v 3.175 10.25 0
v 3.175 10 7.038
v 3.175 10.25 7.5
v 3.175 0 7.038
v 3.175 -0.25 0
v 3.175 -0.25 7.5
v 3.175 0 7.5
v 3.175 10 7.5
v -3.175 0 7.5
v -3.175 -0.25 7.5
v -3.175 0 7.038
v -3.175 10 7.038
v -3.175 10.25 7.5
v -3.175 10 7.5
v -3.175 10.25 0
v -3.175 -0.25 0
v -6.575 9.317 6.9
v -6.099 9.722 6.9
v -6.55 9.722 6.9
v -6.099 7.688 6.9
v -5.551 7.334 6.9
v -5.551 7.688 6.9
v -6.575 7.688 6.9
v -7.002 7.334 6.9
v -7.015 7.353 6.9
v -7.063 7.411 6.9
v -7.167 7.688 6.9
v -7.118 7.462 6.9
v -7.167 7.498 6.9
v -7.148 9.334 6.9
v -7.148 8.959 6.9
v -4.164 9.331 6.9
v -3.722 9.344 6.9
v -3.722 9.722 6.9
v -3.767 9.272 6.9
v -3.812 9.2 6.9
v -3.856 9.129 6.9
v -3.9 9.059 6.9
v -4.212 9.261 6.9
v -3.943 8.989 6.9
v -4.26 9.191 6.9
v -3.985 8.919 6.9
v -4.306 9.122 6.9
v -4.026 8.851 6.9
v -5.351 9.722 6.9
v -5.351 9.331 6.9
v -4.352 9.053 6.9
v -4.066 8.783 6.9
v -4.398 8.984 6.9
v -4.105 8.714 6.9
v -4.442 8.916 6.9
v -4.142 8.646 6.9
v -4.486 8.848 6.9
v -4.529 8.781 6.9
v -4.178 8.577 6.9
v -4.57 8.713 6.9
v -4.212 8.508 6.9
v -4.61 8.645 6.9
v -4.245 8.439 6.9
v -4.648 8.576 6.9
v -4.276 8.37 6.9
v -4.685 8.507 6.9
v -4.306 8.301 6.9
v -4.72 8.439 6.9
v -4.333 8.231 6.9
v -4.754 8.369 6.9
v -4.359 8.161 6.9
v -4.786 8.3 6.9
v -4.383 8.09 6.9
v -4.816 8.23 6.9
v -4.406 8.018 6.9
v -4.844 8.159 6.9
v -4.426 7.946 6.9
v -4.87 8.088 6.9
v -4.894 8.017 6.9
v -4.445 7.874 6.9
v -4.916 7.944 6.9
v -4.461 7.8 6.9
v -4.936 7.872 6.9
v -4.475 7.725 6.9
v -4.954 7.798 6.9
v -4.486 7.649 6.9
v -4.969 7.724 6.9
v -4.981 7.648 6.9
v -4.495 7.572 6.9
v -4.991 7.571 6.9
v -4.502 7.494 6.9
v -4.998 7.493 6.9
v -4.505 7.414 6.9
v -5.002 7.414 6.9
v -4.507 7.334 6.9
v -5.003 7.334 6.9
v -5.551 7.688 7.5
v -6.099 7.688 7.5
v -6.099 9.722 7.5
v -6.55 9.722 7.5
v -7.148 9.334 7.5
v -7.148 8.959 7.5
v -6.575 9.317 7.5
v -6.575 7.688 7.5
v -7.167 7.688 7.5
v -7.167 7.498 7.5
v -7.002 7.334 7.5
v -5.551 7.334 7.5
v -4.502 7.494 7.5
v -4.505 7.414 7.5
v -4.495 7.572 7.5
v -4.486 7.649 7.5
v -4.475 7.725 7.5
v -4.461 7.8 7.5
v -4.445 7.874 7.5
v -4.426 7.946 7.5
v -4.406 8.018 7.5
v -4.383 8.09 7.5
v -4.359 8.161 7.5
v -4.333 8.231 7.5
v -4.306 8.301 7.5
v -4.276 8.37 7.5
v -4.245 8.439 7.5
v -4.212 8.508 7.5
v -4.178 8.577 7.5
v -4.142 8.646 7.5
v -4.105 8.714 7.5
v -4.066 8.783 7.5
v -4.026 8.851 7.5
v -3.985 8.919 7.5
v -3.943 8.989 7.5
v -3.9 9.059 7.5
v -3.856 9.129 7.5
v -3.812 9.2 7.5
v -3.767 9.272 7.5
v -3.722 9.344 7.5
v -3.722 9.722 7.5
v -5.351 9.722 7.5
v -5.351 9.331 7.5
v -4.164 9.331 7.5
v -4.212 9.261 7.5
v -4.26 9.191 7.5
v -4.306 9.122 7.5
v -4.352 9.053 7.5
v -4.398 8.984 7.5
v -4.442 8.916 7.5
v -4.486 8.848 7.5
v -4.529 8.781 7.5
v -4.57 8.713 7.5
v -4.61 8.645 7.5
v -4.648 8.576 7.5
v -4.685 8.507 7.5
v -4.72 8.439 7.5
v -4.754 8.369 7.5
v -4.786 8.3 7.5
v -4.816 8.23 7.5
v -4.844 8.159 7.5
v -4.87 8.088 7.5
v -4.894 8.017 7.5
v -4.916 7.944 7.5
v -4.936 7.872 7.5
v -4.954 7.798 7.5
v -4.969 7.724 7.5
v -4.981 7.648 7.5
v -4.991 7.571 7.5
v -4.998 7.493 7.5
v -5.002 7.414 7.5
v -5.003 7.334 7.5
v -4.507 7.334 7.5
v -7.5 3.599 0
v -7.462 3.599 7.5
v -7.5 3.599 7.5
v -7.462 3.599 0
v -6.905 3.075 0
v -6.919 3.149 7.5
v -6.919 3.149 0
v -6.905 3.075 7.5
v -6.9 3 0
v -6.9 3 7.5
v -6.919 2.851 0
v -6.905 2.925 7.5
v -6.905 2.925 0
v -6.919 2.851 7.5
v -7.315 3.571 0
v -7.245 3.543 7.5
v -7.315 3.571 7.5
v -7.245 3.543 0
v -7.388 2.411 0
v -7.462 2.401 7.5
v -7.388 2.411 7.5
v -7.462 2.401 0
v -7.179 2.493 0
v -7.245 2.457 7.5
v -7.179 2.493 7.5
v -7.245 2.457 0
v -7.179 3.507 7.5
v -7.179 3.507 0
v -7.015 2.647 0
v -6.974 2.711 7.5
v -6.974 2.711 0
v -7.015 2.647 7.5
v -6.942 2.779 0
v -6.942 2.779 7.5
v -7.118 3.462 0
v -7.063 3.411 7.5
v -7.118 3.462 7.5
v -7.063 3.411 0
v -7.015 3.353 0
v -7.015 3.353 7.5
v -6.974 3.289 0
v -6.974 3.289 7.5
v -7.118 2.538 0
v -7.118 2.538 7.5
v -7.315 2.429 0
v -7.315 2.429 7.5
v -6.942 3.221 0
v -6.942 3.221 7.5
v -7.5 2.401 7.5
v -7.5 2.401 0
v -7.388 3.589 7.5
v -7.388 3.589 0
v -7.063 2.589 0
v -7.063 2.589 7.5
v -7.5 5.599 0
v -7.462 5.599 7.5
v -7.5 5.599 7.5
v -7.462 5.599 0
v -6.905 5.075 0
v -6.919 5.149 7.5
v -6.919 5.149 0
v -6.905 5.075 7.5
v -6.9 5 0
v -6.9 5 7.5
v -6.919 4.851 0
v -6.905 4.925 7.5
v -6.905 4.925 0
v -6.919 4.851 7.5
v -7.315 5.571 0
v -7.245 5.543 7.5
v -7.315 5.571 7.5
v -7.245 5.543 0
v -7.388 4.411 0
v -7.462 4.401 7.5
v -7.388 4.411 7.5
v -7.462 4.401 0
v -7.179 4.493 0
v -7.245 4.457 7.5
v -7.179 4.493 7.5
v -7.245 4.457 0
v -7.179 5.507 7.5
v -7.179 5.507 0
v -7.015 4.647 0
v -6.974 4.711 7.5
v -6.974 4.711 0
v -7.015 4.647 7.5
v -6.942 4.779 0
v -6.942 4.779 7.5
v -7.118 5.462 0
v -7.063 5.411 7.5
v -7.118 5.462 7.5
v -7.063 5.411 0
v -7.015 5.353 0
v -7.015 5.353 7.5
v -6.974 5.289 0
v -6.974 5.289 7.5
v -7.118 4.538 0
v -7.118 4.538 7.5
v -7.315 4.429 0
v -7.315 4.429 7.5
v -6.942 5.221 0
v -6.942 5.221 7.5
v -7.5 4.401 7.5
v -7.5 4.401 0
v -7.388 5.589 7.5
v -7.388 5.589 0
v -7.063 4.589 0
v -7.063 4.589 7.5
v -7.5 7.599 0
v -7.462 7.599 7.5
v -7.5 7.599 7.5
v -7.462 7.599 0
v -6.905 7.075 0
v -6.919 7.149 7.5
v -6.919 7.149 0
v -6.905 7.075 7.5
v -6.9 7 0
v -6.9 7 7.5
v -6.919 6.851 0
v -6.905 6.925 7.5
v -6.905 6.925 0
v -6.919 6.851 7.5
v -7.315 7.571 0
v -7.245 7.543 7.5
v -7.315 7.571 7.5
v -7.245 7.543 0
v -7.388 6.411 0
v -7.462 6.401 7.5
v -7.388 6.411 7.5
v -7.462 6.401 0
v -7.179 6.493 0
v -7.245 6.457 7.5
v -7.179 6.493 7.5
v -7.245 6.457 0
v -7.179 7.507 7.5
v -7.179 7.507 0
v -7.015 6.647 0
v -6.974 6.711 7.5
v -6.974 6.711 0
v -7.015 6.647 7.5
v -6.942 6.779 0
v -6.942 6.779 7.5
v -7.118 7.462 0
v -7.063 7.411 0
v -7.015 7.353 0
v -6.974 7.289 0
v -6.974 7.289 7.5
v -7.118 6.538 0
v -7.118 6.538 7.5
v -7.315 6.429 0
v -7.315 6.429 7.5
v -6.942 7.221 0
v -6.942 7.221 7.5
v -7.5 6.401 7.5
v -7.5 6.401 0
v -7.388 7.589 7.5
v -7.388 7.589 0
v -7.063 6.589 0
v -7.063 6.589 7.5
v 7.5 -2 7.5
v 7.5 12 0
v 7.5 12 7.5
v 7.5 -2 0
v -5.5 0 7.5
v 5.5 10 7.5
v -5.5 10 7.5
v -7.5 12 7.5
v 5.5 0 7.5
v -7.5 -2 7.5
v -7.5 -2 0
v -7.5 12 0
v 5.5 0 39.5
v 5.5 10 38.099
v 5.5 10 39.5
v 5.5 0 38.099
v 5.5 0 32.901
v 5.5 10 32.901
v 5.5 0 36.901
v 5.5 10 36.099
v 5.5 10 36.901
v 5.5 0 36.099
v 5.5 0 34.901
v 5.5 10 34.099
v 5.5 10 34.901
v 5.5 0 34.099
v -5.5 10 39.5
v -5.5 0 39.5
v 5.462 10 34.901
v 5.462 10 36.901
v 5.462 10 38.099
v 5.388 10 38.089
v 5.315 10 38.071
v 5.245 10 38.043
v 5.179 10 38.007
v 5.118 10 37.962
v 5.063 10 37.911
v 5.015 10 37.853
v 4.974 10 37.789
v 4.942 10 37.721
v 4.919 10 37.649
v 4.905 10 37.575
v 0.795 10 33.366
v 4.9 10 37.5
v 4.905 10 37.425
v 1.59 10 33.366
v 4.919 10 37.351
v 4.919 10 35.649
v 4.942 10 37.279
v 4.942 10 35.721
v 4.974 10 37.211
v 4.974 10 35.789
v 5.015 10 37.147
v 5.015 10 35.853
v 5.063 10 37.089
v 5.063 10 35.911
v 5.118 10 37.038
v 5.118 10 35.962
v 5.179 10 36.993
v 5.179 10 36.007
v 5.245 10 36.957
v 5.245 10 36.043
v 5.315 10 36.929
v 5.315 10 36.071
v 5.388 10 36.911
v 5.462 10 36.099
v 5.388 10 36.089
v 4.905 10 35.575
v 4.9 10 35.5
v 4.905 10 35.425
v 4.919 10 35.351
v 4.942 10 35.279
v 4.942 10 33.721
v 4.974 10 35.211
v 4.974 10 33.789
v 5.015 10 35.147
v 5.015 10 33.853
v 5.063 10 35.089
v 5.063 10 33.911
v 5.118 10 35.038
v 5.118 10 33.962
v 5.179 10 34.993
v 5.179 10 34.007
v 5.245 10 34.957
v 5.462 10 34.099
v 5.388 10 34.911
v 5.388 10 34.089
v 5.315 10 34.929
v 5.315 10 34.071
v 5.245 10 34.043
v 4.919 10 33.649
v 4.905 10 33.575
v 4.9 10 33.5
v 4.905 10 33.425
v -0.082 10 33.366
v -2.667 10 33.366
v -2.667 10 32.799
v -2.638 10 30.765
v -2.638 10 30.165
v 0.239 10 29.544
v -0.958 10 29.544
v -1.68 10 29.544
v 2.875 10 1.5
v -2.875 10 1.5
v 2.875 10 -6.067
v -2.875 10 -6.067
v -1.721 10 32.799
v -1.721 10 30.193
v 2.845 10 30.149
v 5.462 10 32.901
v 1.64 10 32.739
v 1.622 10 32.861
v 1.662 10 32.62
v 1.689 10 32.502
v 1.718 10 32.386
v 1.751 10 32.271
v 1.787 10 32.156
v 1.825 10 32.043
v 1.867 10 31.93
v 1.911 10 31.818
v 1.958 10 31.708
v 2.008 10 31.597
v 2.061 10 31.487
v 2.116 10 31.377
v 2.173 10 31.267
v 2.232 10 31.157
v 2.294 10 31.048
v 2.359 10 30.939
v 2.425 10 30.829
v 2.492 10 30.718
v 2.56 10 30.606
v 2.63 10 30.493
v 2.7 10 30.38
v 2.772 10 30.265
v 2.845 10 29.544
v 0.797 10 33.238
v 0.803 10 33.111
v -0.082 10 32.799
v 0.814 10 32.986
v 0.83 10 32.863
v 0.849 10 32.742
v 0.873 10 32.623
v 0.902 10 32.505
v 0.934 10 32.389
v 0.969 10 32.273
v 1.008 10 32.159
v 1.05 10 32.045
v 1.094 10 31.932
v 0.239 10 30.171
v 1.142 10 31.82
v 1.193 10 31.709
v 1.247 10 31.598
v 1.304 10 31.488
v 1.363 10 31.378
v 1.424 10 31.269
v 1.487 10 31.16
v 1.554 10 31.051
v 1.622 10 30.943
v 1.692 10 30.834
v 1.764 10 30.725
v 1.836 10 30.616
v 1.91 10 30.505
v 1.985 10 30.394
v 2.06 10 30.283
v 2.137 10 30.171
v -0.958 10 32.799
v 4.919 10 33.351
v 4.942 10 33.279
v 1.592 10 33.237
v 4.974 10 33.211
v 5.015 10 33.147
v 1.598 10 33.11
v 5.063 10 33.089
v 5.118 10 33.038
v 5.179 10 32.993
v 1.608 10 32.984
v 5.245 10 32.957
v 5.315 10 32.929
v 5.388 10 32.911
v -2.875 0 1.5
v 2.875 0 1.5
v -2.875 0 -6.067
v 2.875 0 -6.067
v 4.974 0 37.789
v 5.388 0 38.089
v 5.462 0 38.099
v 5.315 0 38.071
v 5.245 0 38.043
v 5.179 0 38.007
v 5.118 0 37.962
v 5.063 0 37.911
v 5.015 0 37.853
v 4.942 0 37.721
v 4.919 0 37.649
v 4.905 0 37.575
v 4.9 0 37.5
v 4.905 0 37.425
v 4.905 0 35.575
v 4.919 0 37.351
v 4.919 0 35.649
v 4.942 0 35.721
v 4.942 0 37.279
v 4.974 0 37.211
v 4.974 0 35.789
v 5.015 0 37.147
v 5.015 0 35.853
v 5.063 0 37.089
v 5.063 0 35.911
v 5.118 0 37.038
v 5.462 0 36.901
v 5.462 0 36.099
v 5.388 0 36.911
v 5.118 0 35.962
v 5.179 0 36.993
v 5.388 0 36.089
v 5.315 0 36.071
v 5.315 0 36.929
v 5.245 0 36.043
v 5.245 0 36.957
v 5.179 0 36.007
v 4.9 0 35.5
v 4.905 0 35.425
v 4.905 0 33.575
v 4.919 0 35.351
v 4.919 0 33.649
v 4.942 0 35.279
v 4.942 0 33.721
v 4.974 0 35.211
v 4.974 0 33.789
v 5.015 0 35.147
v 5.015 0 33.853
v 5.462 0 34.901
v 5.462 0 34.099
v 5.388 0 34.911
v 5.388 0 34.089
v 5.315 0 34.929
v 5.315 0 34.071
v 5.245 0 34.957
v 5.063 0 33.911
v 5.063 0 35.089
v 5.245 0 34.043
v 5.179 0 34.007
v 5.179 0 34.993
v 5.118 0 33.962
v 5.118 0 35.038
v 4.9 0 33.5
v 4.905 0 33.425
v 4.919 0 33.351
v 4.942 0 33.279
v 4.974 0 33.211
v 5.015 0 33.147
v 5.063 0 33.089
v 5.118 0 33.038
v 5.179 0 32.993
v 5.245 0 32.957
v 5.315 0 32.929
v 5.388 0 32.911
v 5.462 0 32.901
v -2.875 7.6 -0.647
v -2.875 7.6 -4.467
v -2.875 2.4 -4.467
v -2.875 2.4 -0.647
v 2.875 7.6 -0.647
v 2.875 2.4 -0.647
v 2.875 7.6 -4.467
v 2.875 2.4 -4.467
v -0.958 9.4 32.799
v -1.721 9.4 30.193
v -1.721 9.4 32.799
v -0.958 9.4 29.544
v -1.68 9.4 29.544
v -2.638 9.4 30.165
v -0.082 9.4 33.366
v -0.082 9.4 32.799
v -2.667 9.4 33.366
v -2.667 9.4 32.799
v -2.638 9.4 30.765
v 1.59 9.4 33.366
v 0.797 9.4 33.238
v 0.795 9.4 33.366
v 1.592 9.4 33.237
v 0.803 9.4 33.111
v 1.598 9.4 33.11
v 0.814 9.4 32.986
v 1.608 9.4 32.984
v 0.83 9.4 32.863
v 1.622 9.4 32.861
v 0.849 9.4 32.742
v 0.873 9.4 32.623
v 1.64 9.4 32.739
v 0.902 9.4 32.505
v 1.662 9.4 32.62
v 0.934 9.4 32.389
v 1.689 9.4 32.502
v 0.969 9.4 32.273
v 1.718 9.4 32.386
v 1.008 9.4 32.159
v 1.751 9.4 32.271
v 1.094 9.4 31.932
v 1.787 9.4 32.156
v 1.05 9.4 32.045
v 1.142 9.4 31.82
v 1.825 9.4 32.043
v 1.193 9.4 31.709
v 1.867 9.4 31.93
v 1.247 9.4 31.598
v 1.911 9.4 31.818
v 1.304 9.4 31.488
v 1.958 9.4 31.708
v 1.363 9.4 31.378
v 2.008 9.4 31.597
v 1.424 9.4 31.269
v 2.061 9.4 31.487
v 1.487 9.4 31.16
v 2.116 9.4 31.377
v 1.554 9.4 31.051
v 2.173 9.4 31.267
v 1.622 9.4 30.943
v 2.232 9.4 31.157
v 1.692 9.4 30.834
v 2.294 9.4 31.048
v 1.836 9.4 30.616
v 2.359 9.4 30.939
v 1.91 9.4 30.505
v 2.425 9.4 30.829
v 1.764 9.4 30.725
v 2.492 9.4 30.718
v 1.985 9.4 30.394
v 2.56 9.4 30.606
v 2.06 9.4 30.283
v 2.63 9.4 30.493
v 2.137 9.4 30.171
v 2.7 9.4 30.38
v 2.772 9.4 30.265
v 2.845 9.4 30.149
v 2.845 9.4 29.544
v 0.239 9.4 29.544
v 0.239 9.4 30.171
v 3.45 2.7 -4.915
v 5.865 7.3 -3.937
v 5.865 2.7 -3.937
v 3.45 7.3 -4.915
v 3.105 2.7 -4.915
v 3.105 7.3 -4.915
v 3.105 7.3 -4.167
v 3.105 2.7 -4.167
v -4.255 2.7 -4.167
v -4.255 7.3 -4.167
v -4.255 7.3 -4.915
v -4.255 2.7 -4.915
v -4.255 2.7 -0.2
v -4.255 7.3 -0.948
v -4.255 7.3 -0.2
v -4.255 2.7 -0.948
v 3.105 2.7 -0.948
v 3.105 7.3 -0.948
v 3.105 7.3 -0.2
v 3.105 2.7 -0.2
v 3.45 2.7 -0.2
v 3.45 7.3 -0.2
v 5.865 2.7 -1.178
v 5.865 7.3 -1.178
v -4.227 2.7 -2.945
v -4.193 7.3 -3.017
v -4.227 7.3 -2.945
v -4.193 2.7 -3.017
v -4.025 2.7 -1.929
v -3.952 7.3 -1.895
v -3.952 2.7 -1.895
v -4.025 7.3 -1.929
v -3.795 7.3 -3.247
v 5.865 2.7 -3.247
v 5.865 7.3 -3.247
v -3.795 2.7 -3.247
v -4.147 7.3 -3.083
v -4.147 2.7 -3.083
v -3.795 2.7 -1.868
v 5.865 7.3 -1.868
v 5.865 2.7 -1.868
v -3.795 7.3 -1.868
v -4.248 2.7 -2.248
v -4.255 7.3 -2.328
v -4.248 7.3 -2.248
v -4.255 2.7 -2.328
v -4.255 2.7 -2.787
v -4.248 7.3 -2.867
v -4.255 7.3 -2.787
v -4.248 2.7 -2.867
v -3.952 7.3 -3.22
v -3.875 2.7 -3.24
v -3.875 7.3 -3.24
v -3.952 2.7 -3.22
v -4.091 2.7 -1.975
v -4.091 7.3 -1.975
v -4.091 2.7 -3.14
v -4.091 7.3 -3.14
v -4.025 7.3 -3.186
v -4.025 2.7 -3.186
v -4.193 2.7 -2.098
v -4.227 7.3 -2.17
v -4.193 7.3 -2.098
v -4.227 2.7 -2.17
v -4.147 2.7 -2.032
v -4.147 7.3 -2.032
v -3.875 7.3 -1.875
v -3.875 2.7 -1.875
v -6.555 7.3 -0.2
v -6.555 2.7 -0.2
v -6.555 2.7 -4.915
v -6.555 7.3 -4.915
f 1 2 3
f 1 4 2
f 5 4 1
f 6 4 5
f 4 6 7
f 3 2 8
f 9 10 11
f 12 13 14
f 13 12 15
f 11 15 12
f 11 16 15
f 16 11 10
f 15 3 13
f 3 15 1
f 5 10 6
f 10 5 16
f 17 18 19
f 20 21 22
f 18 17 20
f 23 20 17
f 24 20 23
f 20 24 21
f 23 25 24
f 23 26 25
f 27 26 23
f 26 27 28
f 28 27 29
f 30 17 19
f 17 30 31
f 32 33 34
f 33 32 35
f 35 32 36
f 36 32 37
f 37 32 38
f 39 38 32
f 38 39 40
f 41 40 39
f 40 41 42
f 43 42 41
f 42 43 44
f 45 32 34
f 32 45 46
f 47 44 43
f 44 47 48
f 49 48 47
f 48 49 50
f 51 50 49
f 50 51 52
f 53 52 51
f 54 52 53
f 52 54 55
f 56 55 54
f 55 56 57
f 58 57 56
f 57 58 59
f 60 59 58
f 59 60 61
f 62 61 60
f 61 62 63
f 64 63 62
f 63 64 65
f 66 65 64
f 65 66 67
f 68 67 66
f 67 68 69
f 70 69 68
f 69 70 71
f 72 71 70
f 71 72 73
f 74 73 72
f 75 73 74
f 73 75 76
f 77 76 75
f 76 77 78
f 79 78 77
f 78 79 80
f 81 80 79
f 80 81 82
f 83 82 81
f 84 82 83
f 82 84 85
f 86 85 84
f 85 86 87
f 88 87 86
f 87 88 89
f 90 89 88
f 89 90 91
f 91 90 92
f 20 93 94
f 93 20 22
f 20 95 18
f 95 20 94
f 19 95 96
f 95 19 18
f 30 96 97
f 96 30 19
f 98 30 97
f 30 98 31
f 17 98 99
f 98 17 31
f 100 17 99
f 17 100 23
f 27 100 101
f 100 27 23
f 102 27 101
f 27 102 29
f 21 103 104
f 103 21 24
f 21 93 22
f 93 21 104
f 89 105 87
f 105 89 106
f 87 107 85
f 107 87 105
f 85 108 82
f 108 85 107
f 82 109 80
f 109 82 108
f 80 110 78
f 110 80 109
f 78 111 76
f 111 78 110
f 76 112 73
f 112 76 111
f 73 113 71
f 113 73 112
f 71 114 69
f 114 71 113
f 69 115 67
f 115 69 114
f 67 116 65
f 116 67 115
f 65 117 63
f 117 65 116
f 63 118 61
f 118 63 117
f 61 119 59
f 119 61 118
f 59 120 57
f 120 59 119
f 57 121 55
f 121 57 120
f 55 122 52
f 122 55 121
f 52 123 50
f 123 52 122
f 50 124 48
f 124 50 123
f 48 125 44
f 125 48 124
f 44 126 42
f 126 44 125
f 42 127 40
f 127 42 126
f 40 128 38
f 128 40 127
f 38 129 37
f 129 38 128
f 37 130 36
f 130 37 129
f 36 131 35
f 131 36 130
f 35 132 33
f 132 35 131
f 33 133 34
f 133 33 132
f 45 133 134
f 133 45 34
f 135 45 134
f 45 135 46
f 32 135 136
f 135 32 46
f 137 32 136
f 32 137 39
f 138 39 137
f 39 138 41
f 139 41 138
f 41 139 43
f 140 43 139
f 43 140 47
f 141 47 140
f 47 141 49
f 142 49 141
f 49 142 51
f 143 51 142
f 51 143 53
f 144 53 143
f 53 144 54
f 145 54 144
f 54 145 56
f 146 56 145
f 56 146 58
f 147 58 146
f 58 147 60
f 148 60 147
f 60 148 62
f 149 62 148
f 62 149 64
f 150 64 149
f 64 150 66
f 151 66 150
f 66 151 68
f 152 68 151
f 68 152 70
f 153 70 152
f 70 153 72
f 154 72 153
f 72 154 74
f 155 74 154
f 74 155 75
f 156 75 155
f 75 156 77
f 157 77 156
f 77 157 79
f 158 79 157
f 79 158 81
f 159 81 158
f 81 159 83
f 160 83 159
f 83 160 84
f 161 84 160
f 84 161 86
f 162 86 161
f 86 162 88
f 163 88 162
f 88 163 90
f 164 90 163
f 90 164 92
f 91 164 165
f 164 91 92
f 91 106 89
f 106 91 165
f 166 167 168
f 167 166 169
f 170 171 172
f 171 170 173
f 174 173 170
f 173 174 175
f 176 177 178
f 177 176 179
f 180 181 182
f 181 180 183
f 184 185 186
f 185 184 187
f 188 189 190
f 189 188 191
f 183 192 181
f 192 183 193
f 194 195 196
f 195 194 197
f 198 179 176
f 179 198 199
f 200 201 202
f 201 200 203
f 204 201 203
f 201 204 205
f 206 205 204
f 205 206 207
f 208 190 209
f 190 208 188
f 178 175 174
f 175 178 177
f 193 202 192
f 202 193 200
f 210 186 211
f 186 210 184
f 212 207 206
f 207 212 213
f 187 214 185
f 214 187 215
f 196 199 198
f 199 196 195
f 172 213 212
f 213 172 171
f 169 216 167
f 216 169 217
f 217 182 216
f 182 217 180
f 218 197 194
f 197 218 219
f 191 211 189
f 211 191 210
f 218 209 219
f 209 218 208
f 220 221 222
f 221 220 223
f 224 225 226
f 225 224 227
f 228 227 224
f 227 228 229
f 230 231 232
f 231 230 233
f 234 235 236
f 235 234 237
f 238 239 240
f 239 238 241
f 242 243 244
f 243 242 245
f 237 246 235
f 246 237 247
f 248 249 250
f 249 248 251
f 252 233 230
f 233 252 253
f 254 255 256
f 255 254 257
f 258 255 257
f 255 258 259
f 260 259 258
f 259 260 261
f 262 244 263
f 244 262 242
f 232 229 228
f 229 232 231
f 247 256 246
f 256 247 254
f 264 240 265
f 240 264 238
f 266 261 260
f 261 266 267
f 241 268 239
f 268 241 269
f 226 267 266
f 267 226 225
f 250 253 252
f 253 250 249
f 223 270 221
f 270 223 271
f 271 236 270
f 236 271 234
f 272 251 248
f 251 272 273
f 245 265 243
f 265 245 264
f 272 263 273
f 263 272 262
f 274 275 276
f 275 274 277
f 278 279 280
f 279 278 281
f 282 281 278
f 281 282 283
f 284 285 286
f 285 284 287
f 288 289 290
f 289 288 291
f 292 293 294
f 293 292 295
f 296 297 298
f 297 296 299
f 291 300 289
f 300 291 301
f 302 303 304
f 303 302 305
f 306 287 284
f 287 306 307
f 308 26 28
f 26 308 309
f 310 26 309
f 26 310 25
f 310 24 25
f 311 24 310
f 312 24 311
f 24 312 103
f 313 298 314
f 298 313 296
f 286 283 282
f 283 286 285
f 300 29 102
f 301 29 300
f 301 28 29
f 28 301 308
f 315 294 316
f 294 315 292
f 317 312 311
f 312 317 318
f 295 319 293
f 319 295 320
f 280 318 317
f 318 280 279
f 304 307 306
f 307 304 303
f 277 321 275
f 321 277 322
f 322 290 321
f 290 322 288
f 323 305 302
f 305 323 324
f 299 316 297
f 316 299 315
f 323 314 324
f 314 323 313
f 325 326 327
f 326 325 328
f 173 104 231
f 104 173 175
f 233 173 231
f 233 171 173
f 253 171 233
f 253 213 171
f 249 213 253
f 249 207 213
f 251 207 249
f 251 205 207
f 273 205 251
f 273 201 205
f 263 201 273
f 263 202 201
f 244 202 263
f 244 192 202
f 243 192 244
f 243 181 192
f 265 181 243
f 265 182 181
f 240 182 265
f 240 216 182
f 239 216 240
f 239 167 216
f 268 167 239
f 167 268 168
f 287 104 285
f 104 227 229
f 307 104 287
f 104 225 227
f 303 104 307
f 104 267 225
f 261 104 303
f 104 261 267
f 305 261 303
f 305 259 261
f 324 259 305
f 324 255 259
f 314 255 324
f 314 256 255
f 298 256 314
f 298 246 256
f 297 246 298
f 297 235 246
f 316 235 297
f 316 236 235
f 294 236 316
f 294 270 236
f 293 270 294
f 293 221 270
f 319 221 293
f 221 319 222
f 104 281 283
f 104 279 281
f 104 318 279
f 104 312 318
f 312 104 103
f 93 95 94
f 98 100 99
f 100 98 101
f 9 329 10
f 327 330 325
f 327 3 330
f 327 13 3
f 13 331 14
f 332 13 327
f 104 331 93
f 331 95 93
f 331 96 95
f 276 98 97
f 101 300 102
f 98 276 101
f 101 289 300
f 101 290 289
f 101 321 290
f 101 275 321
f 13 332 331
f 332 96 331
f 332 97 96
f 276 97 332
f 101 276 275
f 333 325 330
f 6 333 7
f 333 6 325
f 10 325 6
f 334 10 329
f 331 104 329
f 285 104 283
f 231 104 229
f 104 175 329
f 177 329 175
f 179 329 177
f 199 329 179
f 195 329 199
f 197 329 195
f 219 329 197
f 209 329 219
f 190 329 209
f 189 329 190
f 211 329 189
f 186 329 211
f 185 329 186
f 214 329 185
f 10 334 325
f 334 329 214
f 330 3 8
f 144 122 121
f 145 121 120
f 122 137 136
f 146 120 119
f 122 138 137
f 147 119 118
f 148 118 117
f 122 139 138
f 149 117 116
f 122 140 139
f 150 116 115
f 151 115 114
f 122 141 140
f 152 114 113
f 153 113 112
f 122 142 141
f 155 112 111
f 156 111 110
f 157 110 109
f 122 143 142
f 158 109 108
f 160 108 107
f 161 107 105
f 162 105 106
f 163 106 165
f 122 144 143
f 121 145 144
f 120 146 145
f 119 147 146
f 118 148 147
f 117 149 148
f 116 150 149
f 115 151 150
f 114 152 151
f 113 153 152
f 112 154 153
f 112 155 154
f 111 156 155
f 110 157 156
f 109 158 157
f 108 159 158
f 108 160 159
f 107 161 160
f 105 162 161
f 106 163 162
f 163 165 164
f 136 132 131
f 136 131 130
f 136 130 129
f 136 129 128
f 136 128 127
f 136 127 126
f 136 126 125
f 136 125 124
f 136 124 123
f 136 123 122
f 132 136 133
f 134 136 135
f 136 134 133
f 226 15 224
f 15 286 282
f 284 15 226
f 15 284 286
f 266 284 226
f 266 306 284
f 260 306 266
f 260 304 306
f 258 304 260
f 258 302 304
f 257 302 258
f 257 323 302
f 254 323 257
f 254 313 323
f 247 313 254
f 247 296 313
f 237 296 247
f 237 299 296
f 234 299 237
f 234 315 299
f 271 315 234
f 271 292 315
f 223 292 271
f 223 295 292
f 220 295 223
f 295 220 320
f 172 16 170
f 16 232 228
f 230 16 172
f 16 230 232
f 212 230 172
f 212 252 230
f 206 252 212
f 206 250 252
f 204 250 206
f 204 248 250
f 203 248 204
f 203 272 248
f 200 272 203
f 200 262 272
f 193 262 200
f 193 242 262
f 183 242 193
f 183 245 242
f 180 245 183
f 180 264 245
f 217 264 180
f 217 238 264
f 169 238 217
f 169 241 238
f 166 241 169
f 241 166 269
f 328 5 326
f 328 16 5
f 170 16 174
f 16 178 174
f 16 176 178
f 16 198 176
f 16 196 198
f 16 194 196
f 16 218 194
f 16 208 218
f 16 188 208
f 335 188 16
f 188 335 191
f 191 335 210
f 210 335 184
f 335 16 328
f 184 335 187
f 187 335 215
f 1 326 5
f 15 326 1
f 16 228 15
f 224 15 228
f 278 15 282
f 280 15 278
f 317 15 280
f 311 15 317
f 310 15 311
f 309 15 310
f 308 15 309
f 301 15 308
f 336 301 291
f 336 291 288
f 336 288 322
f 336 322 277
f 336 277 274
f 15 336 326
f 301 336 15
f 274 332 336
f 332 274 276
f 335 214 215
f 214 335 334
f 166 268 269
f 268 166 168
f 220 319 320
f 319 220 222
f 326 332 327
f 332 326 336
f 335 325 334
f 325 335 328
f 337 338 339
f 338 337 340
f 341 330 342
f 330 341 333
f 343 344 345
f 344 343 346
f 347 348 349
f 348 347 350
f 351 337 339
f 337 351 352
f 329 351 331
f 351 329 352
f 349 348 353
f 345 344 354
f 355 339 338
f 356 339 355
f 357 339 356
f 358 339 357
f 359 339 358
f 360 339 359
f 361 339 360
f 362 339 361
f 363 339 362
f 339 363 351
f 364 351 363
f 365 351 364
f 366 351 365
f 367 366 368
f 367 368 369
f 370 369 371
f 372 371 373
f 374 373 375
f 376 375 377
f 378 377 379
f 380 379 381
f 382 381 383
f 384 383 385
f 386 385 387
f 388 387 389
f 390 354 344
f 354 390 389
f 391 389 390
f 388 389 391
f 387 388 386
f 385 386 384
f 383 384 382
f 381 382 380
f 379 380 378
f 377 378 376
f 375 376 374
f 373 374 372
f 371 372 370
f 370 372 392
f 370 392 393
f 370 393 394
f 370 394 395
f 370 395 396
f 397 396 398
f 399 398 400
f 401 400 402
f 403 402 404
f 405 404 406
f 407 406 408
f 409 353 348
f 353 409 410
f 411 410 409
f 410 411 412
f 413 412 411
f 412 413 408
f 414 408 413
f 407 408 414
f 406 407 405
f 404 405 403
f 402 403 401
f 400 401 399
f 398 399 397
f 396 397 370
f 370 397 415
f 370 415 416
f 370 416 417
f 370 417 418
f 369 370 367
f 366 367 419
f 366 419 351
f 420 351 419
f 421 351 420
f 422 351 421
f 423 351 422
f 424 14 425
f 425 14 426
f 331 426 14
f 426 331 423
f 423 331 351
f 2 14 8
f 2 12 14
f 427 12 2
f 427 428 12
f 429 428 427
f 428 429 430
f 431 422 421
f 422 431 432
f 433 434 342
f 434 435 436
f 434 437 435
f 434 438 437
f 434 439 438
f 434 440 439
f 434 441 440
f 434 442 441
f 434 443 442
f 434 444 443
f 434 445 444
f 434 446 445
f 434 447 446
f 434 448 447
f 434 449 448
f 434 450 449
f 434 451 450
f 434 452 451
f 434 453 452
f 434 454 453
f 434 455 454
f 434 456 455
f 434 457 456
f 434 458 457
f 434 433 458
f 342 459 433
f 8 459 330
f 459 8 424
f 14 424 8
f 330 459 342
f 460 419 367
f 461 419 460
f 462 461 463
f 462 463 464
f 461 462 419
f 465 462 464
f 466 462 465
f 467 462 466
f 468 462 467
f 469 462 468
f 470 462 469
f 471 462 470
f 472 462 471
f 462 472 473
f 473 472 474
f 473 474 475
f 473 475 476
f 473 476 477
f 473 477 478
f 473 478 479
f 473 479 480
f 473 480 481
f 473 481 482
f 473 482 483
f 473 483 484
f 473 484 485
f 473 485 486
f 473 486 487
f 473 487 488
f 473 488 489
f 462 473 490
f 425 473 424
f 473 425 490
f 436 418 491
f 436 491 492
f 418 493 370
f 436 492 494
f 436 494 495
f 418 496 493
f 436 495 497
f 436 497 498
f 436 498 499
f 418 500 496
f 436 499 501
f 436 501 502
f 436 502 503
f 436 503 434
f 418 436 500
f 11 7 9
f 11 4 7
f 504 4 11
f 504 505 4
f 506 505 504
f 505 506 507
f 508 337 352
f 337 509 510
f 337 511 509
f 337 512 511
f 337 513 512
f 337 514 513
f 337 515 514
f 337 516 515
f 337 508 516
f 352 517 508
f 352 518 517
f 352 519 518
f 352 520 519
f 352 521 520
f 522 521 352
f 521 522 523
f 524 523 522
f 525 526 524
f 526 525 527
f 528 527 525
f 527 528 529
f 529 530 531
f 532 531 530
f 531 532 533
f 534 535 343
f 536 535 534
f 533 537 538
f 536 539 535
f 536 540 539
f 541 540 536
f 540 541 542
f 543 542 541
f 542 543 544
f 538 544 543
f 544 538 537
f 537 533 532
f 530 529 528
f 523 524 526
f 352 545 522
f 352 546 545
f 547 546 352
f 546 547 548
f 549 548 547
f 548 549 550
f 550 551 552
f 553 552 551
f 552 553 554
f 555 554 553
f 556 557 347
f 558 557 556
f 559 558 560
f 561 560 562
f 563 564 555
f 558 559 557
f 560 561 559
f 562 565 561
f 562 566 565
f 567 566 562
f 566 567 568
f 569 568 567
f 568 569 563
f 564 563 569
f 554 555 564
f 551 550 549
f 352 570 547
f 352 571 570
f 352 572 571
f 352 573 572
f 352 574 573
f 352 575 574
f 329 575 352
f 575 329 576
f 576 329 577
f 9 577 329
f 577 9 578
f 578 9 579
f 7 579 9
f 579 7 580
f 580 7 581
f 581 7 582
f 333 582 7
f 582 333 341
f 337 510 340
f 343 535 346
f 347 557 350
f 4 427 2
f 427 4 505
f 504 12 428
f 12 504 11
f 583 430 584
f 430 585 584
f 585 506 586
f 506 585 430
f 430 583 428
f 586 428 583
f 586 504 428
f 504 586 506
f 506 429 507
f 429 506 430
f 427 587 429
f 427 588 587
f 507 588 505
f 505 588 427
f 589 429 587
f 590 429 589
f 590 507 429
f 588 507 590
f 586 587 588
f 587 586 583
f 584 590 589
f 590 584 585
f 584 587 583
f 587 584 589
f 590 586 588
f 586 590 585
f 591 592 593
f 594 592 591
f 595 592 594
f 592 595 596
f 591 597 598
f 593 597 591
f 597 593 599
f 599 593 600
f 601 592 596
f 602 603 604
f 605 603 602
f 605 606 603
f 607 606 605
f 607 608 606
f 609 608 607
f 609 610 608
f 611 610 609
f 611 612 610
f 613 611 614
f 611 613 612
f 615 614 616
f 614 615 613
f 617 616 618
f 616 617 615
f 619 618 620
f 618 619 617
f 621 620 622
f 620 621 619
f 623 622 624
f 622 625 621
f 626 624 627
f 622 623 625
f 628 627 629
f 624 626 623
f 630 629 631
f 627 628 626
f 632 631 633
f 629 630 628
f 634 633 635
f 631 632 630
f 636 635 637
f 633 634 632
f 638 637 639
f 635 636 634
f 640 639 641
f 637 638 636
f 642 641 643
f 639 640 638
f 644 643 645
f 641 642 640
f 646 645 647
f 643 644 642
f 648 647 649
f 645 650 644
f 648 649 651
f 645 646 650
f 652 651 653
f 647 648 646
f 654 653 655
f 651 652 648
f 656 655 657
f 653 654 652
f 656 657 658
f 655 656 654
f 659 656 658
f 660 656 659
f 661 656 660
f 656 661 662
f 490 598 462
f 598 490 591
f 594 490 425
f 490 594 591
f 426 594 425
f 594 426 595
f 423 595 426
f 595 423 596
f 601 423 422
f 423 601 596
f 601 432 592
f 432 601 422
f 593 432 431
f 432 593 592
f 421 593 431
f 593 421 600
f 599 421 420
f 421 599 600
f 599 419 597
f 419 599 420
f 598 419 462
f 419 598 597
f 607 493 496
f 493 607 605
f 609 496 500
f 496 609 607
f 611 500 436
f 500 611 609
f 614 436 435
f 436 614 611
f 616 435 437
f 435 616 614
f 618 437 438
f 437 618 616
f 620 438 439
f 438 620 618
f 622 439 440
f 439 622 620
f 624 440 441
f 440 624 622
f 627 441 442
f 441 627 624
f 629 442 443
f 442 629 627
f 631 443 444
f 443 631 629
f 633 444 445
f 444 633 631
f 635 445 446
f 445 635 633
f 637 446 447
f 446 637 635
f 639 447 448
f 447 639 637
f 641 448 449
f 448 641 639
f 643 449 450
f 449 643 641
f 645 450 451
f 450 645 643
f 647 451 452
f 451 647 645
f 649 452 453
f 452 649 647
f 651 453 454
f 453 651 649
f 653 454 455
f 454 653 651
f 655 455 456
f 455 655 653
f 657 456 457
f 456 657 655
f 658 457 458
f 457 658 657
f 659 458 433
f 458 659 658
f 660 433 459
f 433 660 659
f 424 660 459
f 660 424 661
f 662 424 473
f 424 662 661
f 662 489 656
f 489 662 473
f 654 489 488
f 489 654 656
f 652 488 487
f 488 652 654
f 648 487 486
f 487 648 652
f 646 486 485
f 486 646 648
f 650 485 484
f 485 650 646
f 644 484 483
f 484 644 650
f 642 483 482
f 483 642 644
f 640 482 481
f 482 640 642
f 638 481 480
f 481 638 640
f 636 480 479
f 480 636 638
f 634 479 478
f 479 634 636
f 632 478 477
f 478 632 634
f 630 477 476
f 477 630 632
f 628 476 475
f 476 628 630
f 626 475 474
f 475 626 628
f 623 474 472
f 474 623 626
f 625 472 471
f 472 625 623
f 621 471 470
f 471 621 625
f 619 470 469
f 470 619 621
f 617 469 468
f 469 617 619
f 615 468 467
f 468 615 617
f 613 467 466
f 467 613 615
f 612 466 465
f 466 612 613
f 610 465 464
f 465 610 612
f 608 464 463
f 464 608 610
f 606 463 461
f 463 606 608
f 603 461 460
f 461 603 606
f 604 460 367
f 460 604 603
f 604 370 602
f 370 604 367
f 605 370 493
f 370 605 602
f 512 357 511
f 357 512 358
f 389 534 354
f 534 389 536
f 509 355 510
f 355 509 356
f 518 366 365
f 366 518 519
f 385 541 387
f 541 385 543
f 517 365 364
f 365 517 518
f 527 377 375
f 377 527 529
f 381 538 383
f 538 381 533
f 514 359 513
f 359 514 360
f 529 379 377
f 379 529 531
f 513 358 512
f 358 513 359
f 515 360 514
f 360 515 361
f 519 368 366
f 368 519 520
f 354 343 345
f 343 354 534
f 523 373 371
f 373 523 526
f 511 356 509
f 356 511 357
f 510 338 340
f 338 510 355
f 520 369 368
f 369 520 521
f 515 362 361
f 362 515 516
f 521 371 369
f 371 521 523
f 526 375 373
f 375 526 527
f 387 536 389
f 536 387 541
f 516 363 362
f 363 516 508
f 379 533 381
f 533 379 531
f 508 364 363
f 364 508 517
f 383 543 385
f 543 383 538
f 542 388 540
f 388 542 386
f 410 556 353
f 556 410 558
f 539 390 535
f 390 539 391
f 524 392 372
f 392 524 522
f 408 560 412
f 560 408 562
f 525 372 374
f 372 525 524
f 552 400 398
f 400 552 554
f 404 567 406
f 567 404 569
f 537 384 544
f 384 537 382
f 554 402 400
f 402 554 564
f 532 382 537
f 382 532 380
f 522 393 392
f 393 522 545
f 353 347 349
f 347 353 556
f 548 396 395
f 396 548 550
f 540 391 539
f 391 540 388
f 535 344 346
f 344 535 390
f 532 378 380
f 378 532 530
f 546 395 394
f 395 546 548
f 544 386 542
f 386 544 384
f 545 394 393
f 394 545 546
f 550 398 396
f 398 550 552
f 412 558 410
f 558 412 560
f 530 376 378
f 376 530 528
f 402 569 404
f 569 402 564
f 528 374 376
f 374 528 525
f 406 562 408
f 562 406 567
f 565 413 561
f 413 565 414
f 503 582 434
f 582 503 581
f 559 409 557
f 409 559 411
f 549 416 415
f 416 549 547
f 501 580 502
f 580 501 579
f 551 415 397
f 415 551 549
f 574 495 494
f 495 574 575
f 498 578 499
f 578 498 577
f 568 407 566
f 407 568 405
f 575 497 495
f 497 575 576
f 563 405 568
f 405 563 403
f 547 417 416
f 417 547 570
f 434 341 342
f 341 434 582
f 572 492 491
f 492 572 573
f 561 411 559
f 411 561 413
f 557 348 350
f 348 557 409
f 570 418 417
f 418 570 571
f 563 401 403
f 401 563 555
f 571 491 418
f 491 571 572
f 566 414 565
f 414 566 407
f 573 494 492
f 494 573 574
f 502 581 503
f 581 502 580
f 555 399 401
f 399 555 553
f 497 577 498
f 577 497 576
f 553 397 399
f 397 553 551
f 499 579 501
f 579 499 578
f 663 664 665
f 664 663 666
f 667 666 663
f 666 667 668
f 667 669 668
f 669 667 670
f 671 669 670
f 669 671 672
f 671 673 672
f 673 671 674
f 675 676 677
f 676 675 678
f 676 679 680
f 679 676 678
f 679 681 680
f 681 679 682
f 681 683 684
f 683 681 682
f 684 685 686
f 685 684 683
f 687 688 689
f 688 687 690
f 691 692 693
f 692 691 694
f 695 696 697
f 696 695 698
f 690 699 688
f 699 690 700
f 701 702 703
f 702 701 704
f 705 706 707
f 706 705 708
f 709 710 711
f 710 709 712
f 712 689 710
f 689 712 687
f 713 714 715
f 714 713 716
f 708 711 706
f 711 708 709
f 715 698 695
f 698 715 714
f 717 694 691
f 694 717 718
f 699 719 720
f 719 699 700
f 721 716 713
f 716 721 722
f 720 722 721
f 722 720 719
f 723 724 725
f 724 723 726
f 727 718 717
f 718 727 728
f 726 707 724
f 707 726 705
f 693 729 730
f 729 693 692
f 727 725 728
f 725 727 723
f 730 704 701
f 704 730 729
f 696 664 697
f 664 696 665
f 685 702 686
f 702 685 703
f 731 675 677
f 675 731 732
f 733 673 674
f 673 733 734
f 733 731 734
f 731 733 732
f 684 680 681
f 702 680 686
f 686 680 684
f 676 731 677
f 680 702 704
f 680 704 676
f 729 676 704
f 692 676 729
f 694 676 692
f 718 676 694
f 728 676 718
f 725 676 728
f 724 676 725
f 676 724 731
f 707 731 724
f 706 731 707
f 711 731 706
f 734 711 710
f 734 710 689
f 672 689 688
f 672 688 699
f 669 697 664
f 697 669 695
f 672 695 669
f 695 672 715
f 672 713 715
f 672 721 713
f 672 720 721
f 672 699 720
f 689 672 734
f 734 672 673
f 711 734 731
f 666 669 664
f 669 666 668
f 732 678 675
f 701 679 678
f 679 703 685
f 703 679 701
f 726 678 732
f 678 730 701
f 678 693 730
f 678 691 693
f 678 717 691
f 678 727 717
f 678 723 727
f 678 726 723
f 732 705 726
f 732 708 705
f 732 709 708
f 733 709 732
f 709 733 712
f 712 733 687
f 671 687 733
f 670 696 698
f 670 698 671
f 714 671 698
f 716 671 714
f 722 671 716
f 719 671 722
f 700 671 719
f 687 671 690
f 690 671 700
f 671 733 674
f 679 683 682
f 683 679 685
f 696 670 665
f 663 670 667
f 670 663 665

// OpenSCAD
$fn = 50;

difference() {
	union() {
		translate(v = [0, 0, 0]) {
			rotate(a = [0, 0, 0]) {
				difference() {
					union() {
						translate(v = [-7.5, -2.0, 0]) {
							cube(size = [15.0, 14.0, 7.5]);
						}
					}
					union() {
						translate(v = [-3.175, -0.25, -0.1]) {
							cube(size = [6.35, 10.5, 7.7]);
						}
						translate(v = [-5.5, 8.5, 6.9]) {
							linear_extrude(height = 0.7) {
								text(font = "Arial:style=Bold", halign = "center", size = 2.5, text = "17", valign = "center");
							}
						}
						translate(v = [-7.5, 3, -0.1]) {
							cylinder(h = 7.7, r = 0.6);
						}
						translate(v = [-7.5, 5, -0.1]) {
							cylinder(h = 7.7, r = 0.6);
						}
						translate(v = [-7.5, 7, -0.1]) {
							cylinder(h = 7.7, r = 0.6);
						}
					}
				}
			}
		}
		translate(v = [0, 0, 7.5]) {
			rotate(a = [0, 0, 0]) {
				difference() {
					union() {
						translate(v = [-5.5, 0, 0]) {
							cube(size = [11.0, 10.0, 32.0]);
						}
						translate(v = [0, 10.0, 0]) {
							rotate(a = [90, 0, 0]) {
								linear_extrude(height = 10.0) {
									polygon(points = [[-2.875, -13.5675], [2.875, -13.5675], [2.875, -6.0], [3.2, 0], [3.2, 0.1], [-3.2, 0.1], [-3.2, 0], [-2.875, -6.0]]);
								}
							}
						}
					}
					union() {
						translate(v = [-2.975, 2.4000000000000004, -11.9675]) {
							cube(size = [5.95, 5.199999999999999, 3.8200000000000003]);
						}
						translate(v = [0, 9.4, 24.0]) {
							rotate(a = [-90, 0, 0]) {
								linear_extrude(height = 0.7) {
									text(font = "Arial:style=Bold", halign = "center", size = 4.0, text = "17", valign = "center");
								}
							}
						}
						translate(v = [5.5, 10.1, 30.0]) {
							rotate(a = [90, 0, 0]) {
								cylinder(h = 10.2, r = 0.6);
							}
						}
						translate(v = [5.5, 10.1, 28.0]) {
							rotate(a = [90, 0, 0]) {
								cylinder(h = 10.2, r = 0.6);
							}
						}
						translate(v = [5.5, 10.1, 26.0]) {
							rotate(a = [90, 0, 0]) {
								cylinder(h = 10.2, r = 0.6);
							}
						}
					}
				}
			}
		}
		translate(v = [0, 2.7, -2.557499999999999]) {
			rotate(a = [0, 0, 0]) {
				difference() {
					union() {
						translate(v = [-6.555, 0, -2.3575]) {
							cube(size = [12.42, 4.6, 4.715]);
						}
					}
					union() {
						translate(v = [0, 4.699999999999999, 0]) {
							rotate(a = [90, 0, 0]) {
								linear_extrude(height = 4.8) {
									polygon(points = [[-4.255, -1.61], [3.105, -1.61], [3.105, -2.3575], [3.45, -2.3575], [5.865, -1.38], [5.965, -1.38], [5.965, -2.4575], [-4.255, -2.4575]]);
								}
							}
						}
						translate(v = [0, 4.699999999999999, 0]) {
							rotate(a = [90, 0, 0]) {
								linear_extrude(height = 4.8) {
									polygon(points = [[-4.255, 1.61], [3.105, 1.61], [3.105, 2.3575], [3.45, 2.3575], [5.865, 1.38], [5.965, 1.38], [5.965, 2.4575], [-4.255, 2.4575]]);
								}
							}
						}
						translate(v = [0, 4.699999999999999, 0]) {
							rotate(a = [90, 0, 0]) {
								linear_extrude(height = 4.8) {
									polygon(points = [[-4.255, 0.23], [-4.248012, 0.309878], [-4.227259, 0.387329], [-4.193372, 0.46], [-4.14738, 0.525682], [-4.090682, 0.58238], [-4.025, 0.628372], [-3.952329, 0.662259], [-3.874878, 0.683012], [-3.795, 0.69], [5.965, 0.69], [5.965, -0.69], [-3.795, -0.69], [-3.874878, -0.683012], [-3.952329, -0.662259], [-4.025, -0.628372], [-4.090682, -0.58238], [-4.14738, -0.525682], [-4.193372, -0.46], [-4.227259, -0.387329], [-4.248012, -0.309878], [-4.255, -0.23]]);
								}
							}
						}
					}
				}
			}
		}
	}
	union();
}
